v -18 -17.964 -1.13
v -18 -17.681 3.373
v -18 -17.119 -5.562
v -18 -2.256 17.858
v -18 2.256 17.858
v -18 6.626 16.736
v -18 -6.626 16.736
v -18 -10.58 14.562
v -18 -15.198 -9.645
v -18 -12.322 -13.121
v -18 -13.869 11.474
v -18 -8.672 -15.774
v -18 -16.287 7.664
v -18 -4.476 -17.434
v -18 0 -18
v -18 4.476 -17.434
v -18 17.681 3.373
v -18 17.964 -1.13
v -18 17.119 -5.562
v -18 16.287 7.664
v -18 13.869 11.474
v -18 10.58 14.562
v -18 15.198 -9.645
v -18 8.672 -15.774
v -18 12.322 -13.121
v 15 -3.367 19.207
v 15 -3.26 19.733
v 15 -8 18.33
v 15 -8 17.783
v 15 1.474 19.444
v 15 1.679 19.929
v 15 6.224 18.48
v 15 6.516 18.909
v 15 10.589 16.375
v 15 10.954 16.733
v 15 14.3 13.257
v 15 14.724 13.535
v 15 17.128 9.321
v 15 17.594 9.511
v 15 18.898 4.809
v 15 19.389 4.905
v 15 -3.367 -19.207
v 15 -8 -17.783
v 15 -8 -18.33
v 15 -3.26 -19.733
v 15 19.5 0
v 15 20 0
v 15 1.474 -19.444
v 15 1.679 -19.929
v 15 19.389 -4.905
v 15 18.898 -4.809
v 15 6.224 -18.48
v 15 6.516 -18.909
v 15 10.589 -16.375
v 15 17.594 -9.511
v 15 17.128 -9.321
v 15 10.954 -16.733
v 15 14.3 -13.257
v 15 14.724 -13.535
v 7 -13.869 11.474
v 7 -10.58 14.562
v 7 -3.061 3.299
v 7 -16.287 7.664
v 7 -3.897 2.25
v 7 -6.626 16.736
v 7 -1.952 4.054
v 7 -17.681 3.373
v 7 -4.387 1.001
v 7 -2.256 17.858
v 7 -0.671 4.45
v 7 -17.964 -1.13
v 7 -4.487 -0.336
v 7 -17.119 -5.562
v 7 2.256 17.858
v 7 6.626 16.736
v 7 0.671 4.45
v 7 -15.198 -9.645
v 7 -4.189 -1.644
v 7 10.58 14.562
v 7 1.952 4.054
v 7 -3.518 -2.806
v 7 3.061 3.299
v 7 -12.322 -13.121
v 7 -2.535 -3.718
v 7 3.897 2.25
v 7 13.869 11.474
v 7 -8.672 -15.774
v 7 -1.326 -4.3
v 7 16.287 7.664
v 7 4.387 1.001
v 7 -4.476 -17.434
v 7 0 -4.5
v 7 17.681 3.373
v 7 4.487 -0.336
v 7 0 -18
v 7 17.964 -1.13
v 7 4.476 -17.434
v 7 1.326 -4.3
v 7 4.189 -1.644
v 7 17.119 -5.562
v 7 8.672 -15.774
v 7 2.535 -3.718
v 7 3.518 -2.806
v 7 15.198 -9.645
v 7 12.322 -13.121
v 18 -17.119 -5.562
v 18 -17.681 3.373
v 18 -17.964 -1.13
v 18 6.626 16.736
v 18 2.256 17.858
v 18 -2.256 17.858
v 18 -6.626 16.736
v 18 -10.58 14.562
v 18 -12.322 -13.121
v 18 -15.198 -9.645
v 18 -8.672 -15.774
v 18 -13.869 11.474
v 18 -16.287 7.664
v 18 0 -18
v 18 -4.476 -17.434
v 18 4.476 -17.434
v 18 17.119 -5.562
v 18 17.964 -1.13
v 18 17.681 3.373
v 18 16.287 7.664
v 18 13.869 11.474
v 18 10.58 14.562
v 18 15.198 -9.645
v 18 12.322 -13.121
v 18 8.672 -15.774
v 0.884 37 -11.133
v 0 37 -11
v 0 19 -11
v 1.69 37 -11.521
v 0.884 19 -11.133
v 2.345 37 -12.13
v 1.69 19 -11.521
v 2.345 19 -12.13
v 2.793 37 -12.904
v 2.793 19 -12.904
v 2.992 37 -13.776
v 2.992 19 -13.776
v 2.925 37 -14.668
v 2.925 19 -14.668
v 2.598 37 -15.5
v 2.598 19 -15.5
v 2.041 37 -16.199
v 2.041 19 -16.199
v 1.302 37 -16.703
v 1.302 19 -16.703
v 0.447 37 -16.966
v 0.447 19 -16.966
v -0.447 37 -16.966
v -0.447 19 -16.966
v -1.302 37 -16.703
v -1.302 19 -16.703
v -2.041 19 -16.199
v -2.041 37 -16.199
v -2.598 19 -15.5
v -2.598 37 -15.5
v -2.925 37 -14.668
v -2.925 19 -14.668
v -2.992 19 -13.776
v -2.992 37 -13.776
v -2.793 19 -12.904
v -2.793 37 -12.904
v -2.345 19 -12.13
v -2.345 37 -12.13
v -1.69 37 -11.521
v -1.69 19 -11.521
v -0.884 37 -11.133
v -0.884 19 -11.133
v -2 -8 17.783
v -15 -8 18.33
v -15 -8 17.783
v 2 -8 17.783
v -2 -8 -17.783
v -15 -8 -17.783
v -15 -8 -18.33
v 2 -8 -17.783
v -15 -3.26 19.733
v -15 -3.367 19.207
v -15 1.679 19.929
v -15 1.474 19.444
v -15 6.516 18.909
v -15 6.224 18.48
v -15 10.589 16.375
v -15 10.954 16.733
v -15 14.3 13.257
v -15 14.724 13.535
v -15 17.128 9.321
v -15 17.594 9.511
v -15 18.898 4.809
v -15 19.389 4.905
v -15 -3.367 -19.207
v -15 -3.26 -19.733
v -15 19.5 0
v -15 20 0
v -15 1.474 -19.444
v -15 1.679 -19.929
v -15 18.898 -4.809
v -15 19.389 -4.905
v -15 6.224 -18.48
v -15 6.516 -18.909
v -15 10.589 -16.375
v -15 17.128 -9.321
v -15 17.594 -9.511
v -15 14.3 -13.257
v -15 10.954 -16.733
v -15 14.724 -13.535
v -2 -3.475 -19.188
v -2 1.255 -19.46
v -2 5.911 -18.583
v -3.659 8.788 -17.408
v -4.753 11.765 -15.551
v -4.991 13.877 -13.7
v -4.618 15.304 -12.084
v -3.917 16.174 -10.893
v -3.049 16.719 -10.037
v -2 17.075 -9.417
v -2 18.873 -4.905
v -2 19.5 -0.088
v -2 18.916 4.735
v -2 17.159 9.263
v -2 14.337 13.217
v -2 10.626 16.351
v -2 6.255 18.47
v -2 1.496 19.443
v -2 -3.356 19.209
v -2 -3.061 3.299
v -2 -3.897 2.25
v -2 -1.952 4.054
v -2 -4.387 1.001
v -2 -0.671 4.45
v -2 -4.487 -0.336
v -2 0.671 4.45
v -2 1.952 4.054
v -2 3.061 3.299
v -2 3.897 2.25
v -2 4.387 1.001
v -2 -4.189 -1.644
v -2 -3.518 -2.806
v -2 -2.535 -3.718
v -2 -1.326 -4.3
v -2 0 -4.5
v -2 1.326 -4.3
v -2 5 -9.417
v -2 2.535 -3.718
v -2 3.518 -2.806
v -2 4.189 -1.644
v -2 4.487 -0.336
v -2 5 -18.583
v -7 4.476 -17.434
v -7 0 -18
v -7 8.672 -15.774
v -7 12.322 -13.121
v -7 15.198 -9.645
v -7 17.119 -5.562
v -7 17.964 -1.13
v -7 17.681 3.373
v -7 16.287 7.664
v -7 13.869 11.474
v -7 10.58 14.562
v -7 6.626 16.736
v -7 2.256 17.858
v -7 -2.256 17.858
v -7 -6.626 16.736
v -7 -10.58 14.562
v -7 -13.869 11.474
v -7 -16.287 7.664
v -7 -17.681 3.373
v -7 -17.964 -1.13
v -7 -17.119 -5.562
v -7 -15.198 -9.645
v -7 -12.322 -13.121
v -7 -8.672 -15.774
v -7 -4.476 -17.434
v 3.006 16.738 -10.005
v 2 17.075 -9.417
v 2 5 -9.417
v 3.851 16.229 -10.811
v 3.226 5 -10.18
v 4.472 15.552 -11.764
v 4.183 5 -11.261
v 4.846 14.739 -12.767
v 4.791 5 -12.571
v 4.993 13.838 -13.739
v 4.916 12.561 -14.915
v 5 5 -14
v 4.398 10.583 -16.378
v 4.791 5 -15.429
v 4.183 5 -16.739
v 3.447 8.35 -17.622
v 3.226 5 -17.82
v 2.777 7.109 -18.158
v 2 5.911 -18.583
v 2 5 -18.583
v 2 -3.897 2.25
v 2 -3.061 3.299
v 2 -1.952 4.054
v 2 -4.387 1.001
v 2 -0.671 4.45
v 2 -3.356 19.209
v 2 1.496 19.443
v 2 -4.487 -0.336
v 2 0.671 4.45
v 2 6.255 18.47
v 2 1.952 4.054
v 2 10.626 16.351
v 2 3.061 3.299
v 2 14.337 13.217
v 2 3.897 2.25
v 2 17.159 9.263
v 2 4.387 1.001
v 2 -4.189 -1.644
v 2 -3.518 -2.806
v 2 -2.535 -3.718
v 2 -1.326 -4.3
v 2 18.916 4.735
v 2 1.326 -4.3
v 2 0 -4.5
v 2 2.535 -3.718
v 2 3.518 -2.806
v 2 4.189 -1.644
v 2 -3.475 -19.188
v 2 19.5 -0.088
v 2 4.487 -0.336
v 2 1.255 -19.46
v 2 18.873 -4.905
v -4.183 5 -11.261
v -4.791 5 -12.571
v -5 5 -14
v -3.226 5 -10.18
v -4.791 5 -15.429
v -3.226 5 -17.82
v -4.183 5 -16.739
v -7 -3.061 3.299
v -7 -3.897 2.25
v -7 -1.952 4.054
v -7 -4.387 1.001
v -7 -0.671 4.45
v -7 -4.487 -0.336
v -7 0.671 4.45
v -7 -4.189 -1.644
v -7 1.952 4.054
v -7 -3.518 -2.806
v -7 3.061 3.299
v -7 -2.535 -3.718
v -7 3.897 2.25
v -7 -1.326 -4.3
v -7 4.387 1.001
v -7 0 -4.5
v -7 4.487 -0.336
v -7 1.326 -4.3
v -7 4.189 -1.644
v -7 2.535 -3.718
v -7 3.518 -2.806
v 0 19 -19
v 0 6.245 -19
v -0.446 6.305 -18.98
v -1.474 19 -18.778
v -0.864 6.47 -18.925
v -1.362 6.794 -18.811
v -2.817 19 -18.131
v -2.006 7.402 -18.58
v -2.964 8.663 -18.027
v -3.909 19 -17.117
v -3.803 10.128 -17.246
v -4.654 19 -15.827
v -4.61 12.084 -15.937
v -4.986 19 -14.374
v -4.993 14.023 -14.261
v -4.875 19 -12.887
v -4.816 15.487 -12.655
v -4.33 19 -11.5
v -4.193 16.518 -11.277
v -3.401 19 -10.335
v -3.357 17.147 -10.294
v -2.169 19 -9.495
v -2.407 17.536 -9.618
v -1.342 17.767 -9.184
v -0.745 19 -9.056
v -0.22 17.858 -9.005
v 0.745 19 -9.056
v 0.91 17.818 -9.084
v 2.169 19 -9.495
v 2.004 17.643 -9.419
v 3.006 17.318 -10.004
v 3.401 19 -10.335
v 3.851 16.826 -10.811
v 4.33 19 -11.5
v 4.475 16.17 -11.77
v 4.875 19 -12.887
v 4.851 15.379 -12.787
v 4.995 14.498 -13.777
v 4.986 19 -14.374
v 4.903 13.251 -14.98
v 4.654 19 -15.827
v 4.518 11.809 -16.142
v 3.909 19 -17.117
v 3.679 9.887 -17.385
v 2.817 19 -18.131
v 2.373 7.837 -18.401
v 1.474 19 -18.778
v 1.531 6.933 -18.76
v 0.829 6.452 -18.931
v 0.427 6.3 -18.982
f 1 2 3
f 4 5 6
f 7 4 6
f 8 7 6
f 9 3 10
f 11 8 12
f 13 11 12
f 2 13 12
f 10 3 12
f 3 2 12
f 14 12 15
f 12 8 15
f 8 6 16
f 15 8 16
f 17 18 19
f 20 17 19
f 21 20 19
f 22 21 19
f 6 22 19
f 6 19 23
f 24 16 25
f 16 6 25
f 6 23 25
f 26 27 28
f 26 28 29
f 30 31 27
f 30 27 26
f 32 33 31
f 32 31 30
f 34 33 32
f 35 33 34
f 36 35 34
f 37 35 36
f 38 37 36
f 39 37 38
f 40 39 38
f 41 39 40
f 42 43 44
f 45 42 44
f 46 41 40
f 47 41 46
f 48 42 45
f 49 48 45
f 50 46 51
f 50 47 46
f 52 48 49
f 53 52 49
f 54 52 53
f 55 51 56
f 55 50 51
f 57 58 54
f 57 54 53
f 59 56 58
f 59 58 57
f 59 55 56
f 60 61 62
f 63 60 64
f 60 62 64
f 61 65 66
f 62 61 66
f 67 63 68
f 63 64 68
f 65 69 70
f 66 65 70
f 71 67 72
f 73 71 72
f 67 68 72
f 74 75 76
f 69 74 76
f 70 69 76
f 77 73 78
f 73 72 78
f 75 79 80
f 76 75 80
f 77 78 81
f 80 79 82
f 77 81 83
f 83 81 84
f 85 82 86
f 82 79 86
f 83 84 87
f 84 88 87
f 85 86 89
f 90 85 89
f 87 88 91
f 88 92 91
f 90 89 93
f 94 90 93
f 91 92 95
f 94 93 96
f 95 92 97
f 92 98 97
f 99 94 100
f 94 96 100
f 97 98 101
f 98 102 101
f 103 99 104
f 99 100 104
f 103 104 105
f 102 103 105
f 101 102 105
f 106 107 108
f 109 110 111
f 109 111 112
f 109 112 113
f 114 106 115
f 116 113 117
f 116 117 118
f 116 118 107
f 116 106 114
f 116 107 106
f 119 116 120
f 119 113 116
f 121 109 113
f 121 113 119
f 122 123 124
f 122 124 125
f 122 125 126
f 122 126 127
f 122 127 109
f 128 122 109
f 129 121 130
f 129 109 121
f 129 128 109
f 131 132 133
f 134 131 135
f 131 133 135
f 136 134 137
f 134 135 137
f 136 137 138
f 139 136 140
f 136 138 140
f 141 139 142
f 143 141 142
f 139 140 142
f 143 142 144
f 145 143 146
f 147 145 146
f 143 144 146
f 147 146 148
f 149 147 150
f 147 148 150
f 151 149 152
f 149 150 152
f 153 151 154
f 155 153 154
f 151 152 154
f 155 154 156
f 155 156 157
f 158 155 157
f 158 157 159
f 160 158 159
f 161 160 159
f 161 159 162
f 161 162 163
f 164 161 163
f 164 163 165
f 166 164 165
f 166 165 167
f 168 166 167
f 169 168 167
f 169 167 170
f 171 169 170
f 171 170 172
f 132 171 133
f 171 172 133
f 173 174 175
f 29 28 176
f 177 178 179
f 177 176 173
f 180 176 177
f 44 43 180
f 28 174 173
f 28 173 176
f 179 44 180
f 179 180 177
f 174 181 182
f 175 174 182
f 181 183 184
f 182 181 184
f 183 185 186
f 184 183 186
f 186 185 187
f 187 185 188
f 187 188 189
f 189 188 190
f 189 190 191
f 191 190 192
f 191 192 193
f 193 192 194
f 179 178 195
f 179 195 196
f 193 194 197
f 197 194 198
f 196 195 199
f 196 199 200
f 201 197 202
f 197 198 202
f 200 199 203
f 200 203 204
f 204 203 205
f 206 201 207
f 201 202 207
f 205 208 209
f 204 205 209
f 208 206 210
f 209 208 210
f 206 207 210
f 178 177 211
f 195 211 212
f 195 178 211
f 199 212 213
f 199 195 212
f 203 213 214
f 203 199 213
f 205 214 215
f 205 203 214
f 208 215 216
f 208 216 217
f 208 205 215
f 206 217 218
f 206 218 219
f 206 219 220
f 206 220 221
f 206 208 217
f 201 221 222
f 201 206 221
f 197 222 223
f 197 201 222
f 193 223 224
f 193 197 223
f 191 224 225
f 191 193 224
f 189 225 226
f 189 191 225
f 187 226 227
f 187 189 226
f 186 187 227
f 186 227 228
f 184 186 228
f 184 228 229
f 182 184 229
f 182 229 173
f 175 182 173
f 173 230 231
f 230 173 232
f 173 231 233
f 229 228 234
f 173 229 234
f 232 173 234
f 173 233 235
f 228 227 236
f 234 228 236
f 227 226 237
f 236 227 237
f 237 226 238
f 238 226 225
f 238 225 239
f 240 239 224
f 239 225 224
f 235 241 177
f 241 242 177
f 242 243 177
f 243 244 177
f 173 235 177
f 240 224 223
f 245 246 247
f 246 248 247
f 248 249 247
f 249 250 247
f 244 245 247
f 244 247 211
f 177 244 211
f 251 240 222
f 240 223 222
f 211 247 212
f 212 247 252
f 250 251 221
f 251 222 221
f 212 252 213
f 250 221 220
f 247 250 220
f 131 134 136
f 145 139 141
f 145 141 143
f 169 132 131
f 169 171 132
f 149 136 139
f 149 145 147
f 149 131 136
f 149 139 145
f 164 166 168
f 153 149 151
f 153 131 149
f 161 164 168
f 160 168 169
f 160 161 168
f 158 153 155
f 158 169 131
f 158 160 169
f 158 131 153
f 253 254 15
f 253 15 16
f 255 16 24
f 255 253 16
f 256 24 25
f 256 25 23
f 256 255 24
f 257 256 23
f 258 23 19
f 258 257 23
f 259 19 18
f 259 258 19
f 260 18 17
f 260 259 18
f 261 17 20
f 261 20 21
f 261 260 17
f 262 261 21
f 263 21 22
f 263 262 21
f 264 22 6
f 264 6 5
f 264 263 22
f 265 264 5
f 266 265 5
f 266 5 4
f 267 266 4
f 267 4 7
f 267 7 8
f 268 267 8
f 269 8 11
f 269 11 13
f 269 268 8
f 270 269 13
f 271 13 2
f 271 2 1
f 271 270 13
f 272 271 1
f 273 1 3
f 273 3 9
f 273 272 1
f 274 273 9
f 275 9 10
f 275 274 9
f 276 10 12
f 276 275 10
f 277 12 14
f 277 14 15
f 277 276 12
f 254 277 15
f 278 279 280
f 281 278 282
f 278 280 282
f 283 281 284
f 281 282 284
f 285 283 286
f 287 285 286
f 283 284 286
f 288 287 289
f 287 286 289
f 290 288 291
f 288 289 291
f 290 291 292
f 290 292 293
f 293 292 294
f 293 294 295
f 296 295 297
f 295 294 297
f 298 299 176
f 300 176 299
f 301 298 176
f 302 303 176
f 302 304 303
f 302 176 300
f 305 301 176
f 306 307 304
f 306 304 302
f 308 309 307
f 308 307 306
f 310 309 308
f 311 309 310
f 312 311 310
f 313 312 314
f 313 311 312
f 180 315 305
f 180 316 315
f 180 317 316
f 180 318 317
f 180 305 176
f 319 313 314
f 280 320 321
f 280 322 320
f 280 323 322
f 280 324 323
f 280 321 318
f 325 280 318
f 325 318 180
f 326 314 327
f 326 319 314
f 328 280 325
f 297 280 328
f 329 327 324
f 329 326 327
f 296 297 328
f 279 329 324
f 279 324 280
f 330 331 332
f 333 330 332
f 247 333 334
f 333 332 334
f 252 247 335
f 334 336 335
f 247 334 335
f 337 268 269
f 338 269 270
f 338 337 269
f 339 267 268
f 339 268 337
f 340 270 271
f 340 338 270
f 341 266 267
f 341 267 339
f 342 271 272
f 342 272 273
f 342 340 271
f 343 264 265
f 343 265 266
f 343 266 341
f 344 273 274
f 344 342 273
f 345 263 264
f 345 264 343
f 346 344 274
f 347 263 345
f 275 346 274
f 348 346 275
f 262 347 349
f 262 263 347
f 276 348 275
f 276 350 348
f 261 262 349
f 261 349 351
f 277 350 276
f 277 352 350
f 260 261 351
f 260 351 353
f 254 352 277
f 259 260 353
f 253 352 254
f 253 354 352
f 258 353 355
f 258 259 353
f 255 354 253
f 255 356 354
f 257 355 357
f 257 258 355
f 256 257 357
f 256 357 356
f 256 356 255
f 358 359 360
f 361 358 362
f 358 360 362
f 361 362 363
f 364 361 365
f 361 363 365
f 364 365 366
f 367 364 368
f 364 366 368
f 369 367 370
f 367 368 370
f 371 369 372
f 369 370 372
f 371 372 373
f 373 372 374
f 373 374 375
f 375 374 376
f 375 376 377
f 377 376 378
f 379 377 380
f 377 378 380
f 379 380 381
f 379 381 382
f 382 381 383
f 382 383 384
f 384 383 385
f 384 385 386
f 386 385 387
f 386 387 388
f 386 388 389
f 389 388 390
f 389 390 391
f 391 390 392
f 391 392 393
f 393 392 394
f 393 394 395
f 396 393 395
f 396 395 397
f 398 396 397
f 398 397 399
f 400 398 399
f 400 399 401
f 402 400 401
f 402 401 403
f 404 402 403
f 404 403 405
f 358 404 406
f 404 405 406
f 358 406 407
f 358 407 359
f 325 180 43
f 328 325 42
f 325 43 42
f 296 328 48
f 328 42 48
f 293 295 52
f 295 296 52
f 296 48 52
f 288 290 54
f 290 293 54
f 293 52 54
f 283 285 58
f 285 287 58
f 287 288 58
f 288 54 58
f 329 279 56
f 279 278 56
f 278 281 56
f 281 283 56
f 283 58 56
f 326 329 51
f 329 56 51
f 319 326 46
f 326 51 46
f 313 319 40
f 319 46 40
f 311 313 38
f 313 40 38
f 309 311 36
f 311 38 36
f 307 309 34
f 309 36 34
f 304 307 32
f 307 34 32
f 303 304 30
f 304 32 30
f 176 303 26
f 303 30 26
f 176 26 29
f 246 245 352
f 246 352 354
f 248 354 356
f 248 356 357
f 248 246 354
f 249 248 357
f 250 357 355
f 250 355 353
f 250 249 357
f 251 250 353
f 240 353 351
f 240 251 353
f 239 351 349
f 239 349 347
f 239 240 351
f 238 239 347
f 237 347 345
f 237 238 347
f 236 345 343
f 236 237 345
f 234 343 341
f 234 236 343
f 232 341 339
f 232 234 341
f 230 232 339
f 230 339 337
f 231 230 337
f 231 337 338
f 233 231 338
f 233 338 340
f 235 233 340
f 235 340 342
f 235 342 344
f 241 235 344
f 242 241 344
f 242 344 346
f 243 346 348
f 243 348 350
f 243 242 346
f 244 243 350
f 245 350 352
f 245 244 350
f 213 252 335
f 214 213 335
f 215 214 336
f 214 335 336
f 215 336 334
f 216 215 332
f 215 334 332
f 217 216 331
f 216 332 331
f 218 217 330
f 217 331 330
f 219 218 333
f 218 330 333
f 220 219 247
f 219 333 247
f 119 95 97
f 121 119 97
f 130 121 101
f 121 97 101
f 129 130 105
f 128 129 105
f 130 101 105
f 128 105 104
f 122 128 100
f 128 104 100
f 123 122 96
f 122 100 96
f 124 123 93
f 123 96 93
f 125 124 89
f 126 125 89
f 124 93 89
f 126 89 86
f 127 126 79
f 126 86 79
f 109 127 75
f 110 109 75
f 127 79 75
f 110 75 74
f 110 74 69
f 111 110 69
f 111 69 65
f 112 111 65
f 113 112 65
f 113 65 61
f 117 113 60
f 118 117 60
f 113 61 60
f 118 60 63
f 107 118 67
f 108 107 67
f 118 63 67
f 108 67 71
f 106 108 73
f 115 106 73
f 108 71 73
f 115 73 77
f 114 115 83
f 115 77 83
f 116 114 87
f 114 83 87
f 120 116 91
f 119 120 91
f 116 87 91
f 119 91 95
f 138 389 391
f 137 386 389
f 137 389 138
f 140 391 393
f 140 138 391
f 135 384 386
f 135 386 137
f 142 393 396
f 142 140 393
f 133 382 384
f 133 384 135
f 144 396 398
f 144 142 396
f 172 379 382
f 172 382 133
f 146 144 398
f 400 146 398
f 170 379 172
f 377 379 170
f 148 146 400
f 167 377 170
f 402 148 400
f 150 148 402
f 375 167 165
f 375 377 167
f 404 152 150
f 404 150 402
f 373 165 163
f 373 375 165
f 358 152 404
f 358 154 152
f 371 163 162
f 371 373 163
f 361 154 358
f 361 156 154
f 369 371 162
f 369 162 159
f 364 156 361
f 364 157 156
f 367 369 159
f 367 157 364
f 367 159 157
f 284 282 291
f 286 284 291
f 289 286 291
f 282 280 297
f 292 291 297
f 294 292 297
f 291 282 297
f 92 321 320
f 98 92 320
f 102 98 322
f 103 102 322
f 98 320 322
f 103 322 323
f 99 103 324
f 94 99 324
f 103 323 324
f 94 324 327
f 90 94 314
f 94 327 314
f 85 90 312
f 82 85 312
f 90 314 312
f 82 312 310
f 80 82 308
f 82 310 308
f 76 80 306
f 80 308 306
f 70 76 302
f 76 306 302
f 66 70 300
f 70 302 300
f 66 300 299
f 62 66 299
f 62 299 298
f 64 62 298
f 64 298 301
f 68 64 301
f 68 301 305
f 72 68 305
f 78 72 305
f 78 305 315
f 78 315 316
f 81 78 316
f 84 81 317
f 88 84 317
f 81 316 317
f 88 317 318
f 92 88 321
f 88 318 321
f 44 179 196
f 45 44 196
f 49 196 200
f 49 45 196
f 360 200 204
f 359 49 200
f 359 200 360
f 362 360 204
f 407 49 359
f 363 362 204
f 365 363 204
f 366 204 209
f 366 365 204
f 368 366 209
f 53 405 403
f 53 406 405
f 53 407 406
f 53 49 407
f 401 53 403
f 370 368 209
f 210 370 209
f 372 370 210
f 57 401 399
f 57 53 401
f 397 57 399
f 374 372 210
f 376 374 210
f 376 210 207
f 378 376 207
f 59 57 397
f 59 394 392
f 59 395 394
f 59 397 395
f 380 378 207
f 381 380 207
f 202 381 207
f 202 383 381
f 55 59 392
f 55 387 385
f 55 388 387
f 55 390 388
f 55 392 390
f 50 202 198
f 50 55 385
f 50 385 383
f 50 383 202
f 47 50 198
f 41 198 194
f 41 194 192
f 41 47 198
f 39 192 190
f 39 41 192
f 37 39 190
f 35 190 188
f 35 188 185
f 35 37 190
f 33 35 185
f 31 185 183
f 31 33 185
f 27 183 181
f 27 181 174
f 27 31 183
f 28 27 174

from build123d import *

# Parameters (mm, degrees)
BASE_ROUE_DEPTH         = 15
ESQUISSE2_R             = 19.5
VIDE_ROUE_DEPTH         = 13
ESQUISSE3_R             = 4.5
AXE_ROUE_DEPTH          = 5
ESQUISSE4_R             = 18
ROUE_DEPTH              = 11
ESQUISSE6_R             = 5
VIS_DEPTH               = 32
ENL_V_START             = -18
ESQUISSE7_R             = 5
ESQUISSE7_R_2           = 3
ENL_V_MAT_EXTRU_3_DEPTH = 18


with BuildPart() as part:
    # Esquisse1 → BASE ROUE (new body)
    with BuildSketch(Plane(origin=(0, 0, 0), x_dir=(0, 0, -1), z_dir=(1, 0, 0))):
        with BuildLine():
            Line((-18.33030278, -8), (18.33030278, -8))
            ThreePointArc((18.33030278, -8), (0, 20), (-18.33030278, -8))
        make_face()
    base_roue = extrude(amount=BASE_ROUE_DEPTH)

    # Esquisse2 → VIDE ROUE (cut)
    with BuildSketch(Plane(origin=(15, 0, 0), x_dir=(0, 0, -1), z_dir=(1, 0, 0))):
        Circle(ESQUISSE2_R)
    vide_roue = extrude(amount=-VIDE_ROUE_DEPTH, mode=Mode.SUBTRACT)

    # Esquisse3 → AXE ROUE (add)
    with BuildSketch(Plane(origin=(2, 0, 0), x_dir=(0, 0, -1), z_dir=(1, 0, 0))):
        Circle(ESQUISSE3_R)
    axe_roue = extrude(amount=AXE_ROUE_DEPTH)

    # Esquisse4 → ROUE (add)
    with BuildSketch(Plane(origin=(7, 0, 0), x_dir=(0, 0, -1), z_dir=(1, 0, 0))):
        Circle(ESQUISSE4_R)
    roue = extrude(amount=ROUE_DEPTH)

    # SYM ROUE + BASE: BASE ROUE, VIDE ROUE, AXE ROUE, ROUE across plane
    add(base_roue.mirror(Plane(origin=(0, 0, 0), x_dir=(0, 0, 1), z_dir=(1, 0, 0))))
    add(vide_roue.mirror(Plane(origin=(0, 0, 0), x_dir=(0, 0, 1), z_dir=(1, 0, 0))), mode=Mode.SUBTRACT)
    add(axe_roue.mirror(Plane(origin=(0, 0, 0), x_dir=(0, 0, 1), z_dir=(1, 0, 0))))
    add(roue.mirror(Plane(origin=(0, 0, 0), x_dir=(0, 0, 1), z_dir=(1, 0, 0))))

    # Esquisse6 → VIS (add)
    with BuildSketch(Plane(origin=(0, 5, 0), x_dir=(1, 0, 0), z_dir=(0, 1, 0))):
        with Locations(Location((0, 14, 0), (0, 0, 90))):
            Circle(ESQUISSE6_R)
    extrude(amount=VIS_DEPTH)

    # Esquisse7 → Enlèv. mat.-Extru.3 (cut)
    with BuildSketch(Plane(origin=(0, 37, 0), x_dir=(1, 0, 0), z_dir=(0, 1, 0)).offset(ENL_V_START)):
        with Locations(Location((0, 14, 0), (0, 0, 90))):
            Circle(ESQUISSE7_R)
        with Locations(Location((0, 14, 0), (0, 0, 270))):
            Circle(ESQUISSE7_R_2, mode=Mode.SUBTRACT)
    extrude(amount=ENL_V_MAT_EXTRU_3_DEPTH, mode=Mode.SUBTRACT)


solid = part.part
